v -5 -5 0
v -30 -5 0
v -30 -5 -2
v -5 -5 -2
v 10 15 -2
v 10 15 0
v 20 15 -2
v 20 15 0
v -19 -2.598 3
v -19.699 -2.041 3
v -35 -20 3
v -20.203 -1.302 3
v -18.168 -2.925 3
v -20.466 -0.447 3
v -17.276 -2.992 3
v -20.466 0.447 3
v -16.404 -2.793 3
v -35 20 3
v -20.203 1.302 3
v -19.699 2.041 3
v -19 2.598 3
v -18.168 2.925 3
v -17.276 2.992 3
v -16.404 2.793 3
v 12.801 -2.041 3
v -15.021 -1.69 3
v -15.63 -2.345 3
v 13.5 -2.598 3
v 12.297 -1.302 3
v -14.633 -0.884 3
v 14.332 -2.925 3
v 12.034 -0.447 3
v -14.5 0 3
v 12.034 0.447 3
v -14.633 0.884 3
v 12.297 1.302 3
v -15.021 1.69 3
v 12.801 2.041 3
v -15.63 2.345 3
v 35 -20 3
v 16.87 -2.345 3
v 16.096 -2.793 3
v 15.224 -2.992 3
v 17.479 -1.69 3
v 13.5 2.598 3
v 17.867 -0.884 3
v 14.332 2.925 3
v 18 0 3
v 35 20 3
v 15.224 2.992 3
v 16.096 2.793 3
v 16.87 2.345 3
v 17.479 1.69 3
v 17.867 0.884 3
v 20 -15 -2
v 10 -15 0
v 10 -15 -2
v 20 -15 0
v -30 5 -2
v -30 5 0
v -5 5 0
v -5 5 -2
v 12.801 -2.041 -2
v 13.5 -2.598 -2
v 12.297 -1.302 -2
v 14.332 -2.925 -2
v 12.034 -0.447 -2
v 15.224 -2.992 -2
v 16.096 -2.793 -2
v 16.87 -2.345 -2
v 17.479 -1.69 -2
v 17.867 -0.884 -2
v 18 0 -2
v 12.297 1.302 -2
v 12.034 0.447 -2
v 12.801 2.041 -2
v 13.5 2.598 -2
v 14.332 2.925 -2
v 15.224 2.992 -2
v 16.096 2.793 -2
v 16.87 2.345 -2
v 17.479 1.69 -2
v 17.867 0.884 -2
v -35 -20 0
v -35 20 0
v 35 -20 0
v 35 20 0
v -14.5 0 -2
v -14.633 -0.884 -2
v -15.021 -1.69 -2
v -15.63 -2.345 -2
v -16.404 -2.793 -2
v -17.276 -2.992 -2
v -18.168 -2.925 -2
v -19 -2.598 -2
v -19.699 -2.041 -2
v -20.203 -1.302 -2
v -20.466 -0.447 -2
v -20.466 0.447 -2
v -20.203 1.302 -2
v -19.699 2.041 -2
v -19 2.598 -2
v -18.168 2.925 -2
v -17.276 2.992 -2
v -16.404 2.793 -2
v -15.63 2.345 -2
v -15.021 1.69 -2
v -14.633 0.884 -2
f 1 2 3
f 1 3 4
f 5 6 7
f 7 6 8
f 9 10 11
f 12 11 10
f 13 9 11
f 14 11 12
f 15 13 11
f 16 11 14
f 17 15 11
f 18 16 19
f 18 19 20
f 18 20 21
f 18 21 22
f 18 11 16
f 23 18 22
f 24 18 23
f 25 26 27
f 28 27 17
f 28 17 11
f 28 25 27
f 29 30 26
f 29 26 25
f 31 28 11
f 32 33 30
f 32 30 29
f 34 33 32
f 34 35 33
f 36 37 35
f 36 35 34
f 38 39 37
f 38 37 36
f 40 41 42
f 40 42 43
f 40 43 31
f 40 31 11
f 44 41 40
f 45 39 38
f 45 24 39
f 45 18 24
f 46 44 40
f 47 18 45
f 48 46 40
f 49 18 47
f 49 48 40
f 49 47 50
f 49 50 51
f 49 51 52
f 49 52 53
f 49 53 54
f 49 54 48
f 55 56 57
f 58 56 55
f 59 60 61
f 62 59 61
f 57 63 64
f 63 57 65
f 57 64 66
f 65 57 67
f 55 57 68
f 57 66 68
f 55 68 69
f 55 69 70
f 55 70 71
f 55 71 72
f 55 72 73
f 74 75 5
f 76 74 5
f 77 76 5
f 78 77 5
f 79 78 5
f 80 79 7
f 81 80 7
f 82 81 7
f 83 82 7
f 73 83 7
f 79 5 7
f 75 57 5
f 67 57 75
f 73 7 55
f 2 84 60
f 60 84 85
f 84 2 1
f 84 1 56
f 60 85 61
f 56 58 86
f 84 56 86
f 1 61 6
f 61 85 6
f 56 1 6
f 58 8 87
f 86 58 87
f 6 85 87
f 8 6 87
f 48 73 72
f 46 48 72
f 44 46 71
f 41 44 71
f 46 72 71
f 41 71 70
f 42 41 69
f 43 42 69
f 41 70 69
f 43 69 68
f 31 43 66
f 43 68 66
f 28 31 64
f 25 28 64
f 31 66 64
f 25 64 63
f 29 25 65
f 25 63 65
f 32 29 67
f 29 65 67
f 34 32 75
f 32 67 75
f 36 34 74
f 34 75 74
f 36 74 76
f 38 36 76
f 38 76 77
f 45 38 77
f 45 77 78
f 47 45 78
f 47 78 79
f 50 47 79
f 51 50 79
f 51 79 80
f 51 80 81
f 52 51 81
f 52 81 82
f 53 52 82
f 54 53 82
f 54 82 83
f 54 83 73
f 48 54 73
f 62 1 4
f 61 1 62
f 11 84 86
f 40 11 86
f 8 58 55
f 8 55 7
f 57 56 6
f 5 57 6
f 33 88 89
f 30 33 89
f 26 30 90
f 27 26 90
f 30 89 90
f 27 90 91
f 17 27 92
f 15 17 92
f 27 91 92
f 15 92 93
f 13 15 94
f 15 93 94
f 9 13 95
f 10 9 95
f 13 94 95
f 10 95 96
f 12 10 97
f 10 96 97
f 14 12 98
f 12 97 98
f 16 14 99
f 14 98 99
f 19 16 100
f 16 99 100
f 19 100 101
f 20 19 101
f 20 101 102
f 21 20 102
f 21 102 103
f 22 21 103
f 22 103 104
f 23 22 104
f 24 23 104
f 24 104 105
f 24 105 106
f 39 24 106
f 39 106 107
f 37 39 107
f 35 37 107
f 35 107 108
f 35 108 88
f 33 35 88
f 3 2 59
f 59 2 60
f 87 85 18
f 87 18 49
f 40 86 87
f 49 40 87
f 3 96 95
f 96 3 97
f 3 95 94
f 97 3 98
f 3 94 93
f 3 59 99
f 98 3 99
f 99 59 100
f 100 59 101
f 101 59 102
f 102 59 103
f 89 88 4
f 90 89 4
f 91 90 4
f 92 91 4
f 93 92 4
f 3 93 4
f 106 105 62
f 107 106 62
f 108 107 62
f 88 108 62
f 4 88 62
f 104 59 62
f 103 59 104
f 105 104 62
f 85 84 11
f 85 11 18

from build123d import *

# Parameters (mm, degrees)
F0_W     = 70
F0_H     = 40
F0_W_2   = 25
F0_H_2   = 10
F0_W_3   = 10
F0_H_3   = 30
F1_DEPTH = 3
F2_DEPTH = 2
F3_R     = 3
F4_R     = 3
F5_DEPTH = 25


with BuildPart() as f1:
    # F0 (on Top) → F1 (new body)
    with BuildSketch(Plane.XY):
        Rectangle(F0_W, F0_H)
        with Locations((-17.5, 0)):
            Rectangle(F0_W_2, F0_H_2, mode=Mode.SUBTRACT)
        with Locations((15, 0)):
            Rectangle(F0_W_3, F0_H_3, mode=Mode.SUBTRACT)
        with Locations((-17.5, 0)):
            Rectangle(F0_W_2, F0_H_2)
        with Locations((15, 0)):
            Rectangle(F0_W_3, F0_H_3)
    extrude(amount=F1_DEPTH)

    # F0 (on Top) → F2 (join)
    with BuildSketch(Plane.XY):
        with Locations((-17.5, 0)):
            Rectangle(F0_W_2, F0_H_2)
        with Locations((15, 0)):
            Rectangle(F0_W_3, F0_H_3)
    extrude(amount=-F2_DEPTH)

    # F3 (on face) + F4 (on face) → F5 (cut)
    with BuildSketch(Plane(origin=(0, 0, -2), x_dir=(1, 0, 0), z_dir=(0, 0, -1))):
        with Locations((-17.5, 0)):
            Circle(F3_R)
    with BuildSketch(Plane(origin=(0, 0, -2), x_dir=(1, 0, 0), z_dir=(0, 0, -1))):
        with Locations((15, 0)):
            Circle(F4_R)
    extrude(amount=-F5_DEPTH, mode=Mode.SUBTRACT)


solid = f1.part
